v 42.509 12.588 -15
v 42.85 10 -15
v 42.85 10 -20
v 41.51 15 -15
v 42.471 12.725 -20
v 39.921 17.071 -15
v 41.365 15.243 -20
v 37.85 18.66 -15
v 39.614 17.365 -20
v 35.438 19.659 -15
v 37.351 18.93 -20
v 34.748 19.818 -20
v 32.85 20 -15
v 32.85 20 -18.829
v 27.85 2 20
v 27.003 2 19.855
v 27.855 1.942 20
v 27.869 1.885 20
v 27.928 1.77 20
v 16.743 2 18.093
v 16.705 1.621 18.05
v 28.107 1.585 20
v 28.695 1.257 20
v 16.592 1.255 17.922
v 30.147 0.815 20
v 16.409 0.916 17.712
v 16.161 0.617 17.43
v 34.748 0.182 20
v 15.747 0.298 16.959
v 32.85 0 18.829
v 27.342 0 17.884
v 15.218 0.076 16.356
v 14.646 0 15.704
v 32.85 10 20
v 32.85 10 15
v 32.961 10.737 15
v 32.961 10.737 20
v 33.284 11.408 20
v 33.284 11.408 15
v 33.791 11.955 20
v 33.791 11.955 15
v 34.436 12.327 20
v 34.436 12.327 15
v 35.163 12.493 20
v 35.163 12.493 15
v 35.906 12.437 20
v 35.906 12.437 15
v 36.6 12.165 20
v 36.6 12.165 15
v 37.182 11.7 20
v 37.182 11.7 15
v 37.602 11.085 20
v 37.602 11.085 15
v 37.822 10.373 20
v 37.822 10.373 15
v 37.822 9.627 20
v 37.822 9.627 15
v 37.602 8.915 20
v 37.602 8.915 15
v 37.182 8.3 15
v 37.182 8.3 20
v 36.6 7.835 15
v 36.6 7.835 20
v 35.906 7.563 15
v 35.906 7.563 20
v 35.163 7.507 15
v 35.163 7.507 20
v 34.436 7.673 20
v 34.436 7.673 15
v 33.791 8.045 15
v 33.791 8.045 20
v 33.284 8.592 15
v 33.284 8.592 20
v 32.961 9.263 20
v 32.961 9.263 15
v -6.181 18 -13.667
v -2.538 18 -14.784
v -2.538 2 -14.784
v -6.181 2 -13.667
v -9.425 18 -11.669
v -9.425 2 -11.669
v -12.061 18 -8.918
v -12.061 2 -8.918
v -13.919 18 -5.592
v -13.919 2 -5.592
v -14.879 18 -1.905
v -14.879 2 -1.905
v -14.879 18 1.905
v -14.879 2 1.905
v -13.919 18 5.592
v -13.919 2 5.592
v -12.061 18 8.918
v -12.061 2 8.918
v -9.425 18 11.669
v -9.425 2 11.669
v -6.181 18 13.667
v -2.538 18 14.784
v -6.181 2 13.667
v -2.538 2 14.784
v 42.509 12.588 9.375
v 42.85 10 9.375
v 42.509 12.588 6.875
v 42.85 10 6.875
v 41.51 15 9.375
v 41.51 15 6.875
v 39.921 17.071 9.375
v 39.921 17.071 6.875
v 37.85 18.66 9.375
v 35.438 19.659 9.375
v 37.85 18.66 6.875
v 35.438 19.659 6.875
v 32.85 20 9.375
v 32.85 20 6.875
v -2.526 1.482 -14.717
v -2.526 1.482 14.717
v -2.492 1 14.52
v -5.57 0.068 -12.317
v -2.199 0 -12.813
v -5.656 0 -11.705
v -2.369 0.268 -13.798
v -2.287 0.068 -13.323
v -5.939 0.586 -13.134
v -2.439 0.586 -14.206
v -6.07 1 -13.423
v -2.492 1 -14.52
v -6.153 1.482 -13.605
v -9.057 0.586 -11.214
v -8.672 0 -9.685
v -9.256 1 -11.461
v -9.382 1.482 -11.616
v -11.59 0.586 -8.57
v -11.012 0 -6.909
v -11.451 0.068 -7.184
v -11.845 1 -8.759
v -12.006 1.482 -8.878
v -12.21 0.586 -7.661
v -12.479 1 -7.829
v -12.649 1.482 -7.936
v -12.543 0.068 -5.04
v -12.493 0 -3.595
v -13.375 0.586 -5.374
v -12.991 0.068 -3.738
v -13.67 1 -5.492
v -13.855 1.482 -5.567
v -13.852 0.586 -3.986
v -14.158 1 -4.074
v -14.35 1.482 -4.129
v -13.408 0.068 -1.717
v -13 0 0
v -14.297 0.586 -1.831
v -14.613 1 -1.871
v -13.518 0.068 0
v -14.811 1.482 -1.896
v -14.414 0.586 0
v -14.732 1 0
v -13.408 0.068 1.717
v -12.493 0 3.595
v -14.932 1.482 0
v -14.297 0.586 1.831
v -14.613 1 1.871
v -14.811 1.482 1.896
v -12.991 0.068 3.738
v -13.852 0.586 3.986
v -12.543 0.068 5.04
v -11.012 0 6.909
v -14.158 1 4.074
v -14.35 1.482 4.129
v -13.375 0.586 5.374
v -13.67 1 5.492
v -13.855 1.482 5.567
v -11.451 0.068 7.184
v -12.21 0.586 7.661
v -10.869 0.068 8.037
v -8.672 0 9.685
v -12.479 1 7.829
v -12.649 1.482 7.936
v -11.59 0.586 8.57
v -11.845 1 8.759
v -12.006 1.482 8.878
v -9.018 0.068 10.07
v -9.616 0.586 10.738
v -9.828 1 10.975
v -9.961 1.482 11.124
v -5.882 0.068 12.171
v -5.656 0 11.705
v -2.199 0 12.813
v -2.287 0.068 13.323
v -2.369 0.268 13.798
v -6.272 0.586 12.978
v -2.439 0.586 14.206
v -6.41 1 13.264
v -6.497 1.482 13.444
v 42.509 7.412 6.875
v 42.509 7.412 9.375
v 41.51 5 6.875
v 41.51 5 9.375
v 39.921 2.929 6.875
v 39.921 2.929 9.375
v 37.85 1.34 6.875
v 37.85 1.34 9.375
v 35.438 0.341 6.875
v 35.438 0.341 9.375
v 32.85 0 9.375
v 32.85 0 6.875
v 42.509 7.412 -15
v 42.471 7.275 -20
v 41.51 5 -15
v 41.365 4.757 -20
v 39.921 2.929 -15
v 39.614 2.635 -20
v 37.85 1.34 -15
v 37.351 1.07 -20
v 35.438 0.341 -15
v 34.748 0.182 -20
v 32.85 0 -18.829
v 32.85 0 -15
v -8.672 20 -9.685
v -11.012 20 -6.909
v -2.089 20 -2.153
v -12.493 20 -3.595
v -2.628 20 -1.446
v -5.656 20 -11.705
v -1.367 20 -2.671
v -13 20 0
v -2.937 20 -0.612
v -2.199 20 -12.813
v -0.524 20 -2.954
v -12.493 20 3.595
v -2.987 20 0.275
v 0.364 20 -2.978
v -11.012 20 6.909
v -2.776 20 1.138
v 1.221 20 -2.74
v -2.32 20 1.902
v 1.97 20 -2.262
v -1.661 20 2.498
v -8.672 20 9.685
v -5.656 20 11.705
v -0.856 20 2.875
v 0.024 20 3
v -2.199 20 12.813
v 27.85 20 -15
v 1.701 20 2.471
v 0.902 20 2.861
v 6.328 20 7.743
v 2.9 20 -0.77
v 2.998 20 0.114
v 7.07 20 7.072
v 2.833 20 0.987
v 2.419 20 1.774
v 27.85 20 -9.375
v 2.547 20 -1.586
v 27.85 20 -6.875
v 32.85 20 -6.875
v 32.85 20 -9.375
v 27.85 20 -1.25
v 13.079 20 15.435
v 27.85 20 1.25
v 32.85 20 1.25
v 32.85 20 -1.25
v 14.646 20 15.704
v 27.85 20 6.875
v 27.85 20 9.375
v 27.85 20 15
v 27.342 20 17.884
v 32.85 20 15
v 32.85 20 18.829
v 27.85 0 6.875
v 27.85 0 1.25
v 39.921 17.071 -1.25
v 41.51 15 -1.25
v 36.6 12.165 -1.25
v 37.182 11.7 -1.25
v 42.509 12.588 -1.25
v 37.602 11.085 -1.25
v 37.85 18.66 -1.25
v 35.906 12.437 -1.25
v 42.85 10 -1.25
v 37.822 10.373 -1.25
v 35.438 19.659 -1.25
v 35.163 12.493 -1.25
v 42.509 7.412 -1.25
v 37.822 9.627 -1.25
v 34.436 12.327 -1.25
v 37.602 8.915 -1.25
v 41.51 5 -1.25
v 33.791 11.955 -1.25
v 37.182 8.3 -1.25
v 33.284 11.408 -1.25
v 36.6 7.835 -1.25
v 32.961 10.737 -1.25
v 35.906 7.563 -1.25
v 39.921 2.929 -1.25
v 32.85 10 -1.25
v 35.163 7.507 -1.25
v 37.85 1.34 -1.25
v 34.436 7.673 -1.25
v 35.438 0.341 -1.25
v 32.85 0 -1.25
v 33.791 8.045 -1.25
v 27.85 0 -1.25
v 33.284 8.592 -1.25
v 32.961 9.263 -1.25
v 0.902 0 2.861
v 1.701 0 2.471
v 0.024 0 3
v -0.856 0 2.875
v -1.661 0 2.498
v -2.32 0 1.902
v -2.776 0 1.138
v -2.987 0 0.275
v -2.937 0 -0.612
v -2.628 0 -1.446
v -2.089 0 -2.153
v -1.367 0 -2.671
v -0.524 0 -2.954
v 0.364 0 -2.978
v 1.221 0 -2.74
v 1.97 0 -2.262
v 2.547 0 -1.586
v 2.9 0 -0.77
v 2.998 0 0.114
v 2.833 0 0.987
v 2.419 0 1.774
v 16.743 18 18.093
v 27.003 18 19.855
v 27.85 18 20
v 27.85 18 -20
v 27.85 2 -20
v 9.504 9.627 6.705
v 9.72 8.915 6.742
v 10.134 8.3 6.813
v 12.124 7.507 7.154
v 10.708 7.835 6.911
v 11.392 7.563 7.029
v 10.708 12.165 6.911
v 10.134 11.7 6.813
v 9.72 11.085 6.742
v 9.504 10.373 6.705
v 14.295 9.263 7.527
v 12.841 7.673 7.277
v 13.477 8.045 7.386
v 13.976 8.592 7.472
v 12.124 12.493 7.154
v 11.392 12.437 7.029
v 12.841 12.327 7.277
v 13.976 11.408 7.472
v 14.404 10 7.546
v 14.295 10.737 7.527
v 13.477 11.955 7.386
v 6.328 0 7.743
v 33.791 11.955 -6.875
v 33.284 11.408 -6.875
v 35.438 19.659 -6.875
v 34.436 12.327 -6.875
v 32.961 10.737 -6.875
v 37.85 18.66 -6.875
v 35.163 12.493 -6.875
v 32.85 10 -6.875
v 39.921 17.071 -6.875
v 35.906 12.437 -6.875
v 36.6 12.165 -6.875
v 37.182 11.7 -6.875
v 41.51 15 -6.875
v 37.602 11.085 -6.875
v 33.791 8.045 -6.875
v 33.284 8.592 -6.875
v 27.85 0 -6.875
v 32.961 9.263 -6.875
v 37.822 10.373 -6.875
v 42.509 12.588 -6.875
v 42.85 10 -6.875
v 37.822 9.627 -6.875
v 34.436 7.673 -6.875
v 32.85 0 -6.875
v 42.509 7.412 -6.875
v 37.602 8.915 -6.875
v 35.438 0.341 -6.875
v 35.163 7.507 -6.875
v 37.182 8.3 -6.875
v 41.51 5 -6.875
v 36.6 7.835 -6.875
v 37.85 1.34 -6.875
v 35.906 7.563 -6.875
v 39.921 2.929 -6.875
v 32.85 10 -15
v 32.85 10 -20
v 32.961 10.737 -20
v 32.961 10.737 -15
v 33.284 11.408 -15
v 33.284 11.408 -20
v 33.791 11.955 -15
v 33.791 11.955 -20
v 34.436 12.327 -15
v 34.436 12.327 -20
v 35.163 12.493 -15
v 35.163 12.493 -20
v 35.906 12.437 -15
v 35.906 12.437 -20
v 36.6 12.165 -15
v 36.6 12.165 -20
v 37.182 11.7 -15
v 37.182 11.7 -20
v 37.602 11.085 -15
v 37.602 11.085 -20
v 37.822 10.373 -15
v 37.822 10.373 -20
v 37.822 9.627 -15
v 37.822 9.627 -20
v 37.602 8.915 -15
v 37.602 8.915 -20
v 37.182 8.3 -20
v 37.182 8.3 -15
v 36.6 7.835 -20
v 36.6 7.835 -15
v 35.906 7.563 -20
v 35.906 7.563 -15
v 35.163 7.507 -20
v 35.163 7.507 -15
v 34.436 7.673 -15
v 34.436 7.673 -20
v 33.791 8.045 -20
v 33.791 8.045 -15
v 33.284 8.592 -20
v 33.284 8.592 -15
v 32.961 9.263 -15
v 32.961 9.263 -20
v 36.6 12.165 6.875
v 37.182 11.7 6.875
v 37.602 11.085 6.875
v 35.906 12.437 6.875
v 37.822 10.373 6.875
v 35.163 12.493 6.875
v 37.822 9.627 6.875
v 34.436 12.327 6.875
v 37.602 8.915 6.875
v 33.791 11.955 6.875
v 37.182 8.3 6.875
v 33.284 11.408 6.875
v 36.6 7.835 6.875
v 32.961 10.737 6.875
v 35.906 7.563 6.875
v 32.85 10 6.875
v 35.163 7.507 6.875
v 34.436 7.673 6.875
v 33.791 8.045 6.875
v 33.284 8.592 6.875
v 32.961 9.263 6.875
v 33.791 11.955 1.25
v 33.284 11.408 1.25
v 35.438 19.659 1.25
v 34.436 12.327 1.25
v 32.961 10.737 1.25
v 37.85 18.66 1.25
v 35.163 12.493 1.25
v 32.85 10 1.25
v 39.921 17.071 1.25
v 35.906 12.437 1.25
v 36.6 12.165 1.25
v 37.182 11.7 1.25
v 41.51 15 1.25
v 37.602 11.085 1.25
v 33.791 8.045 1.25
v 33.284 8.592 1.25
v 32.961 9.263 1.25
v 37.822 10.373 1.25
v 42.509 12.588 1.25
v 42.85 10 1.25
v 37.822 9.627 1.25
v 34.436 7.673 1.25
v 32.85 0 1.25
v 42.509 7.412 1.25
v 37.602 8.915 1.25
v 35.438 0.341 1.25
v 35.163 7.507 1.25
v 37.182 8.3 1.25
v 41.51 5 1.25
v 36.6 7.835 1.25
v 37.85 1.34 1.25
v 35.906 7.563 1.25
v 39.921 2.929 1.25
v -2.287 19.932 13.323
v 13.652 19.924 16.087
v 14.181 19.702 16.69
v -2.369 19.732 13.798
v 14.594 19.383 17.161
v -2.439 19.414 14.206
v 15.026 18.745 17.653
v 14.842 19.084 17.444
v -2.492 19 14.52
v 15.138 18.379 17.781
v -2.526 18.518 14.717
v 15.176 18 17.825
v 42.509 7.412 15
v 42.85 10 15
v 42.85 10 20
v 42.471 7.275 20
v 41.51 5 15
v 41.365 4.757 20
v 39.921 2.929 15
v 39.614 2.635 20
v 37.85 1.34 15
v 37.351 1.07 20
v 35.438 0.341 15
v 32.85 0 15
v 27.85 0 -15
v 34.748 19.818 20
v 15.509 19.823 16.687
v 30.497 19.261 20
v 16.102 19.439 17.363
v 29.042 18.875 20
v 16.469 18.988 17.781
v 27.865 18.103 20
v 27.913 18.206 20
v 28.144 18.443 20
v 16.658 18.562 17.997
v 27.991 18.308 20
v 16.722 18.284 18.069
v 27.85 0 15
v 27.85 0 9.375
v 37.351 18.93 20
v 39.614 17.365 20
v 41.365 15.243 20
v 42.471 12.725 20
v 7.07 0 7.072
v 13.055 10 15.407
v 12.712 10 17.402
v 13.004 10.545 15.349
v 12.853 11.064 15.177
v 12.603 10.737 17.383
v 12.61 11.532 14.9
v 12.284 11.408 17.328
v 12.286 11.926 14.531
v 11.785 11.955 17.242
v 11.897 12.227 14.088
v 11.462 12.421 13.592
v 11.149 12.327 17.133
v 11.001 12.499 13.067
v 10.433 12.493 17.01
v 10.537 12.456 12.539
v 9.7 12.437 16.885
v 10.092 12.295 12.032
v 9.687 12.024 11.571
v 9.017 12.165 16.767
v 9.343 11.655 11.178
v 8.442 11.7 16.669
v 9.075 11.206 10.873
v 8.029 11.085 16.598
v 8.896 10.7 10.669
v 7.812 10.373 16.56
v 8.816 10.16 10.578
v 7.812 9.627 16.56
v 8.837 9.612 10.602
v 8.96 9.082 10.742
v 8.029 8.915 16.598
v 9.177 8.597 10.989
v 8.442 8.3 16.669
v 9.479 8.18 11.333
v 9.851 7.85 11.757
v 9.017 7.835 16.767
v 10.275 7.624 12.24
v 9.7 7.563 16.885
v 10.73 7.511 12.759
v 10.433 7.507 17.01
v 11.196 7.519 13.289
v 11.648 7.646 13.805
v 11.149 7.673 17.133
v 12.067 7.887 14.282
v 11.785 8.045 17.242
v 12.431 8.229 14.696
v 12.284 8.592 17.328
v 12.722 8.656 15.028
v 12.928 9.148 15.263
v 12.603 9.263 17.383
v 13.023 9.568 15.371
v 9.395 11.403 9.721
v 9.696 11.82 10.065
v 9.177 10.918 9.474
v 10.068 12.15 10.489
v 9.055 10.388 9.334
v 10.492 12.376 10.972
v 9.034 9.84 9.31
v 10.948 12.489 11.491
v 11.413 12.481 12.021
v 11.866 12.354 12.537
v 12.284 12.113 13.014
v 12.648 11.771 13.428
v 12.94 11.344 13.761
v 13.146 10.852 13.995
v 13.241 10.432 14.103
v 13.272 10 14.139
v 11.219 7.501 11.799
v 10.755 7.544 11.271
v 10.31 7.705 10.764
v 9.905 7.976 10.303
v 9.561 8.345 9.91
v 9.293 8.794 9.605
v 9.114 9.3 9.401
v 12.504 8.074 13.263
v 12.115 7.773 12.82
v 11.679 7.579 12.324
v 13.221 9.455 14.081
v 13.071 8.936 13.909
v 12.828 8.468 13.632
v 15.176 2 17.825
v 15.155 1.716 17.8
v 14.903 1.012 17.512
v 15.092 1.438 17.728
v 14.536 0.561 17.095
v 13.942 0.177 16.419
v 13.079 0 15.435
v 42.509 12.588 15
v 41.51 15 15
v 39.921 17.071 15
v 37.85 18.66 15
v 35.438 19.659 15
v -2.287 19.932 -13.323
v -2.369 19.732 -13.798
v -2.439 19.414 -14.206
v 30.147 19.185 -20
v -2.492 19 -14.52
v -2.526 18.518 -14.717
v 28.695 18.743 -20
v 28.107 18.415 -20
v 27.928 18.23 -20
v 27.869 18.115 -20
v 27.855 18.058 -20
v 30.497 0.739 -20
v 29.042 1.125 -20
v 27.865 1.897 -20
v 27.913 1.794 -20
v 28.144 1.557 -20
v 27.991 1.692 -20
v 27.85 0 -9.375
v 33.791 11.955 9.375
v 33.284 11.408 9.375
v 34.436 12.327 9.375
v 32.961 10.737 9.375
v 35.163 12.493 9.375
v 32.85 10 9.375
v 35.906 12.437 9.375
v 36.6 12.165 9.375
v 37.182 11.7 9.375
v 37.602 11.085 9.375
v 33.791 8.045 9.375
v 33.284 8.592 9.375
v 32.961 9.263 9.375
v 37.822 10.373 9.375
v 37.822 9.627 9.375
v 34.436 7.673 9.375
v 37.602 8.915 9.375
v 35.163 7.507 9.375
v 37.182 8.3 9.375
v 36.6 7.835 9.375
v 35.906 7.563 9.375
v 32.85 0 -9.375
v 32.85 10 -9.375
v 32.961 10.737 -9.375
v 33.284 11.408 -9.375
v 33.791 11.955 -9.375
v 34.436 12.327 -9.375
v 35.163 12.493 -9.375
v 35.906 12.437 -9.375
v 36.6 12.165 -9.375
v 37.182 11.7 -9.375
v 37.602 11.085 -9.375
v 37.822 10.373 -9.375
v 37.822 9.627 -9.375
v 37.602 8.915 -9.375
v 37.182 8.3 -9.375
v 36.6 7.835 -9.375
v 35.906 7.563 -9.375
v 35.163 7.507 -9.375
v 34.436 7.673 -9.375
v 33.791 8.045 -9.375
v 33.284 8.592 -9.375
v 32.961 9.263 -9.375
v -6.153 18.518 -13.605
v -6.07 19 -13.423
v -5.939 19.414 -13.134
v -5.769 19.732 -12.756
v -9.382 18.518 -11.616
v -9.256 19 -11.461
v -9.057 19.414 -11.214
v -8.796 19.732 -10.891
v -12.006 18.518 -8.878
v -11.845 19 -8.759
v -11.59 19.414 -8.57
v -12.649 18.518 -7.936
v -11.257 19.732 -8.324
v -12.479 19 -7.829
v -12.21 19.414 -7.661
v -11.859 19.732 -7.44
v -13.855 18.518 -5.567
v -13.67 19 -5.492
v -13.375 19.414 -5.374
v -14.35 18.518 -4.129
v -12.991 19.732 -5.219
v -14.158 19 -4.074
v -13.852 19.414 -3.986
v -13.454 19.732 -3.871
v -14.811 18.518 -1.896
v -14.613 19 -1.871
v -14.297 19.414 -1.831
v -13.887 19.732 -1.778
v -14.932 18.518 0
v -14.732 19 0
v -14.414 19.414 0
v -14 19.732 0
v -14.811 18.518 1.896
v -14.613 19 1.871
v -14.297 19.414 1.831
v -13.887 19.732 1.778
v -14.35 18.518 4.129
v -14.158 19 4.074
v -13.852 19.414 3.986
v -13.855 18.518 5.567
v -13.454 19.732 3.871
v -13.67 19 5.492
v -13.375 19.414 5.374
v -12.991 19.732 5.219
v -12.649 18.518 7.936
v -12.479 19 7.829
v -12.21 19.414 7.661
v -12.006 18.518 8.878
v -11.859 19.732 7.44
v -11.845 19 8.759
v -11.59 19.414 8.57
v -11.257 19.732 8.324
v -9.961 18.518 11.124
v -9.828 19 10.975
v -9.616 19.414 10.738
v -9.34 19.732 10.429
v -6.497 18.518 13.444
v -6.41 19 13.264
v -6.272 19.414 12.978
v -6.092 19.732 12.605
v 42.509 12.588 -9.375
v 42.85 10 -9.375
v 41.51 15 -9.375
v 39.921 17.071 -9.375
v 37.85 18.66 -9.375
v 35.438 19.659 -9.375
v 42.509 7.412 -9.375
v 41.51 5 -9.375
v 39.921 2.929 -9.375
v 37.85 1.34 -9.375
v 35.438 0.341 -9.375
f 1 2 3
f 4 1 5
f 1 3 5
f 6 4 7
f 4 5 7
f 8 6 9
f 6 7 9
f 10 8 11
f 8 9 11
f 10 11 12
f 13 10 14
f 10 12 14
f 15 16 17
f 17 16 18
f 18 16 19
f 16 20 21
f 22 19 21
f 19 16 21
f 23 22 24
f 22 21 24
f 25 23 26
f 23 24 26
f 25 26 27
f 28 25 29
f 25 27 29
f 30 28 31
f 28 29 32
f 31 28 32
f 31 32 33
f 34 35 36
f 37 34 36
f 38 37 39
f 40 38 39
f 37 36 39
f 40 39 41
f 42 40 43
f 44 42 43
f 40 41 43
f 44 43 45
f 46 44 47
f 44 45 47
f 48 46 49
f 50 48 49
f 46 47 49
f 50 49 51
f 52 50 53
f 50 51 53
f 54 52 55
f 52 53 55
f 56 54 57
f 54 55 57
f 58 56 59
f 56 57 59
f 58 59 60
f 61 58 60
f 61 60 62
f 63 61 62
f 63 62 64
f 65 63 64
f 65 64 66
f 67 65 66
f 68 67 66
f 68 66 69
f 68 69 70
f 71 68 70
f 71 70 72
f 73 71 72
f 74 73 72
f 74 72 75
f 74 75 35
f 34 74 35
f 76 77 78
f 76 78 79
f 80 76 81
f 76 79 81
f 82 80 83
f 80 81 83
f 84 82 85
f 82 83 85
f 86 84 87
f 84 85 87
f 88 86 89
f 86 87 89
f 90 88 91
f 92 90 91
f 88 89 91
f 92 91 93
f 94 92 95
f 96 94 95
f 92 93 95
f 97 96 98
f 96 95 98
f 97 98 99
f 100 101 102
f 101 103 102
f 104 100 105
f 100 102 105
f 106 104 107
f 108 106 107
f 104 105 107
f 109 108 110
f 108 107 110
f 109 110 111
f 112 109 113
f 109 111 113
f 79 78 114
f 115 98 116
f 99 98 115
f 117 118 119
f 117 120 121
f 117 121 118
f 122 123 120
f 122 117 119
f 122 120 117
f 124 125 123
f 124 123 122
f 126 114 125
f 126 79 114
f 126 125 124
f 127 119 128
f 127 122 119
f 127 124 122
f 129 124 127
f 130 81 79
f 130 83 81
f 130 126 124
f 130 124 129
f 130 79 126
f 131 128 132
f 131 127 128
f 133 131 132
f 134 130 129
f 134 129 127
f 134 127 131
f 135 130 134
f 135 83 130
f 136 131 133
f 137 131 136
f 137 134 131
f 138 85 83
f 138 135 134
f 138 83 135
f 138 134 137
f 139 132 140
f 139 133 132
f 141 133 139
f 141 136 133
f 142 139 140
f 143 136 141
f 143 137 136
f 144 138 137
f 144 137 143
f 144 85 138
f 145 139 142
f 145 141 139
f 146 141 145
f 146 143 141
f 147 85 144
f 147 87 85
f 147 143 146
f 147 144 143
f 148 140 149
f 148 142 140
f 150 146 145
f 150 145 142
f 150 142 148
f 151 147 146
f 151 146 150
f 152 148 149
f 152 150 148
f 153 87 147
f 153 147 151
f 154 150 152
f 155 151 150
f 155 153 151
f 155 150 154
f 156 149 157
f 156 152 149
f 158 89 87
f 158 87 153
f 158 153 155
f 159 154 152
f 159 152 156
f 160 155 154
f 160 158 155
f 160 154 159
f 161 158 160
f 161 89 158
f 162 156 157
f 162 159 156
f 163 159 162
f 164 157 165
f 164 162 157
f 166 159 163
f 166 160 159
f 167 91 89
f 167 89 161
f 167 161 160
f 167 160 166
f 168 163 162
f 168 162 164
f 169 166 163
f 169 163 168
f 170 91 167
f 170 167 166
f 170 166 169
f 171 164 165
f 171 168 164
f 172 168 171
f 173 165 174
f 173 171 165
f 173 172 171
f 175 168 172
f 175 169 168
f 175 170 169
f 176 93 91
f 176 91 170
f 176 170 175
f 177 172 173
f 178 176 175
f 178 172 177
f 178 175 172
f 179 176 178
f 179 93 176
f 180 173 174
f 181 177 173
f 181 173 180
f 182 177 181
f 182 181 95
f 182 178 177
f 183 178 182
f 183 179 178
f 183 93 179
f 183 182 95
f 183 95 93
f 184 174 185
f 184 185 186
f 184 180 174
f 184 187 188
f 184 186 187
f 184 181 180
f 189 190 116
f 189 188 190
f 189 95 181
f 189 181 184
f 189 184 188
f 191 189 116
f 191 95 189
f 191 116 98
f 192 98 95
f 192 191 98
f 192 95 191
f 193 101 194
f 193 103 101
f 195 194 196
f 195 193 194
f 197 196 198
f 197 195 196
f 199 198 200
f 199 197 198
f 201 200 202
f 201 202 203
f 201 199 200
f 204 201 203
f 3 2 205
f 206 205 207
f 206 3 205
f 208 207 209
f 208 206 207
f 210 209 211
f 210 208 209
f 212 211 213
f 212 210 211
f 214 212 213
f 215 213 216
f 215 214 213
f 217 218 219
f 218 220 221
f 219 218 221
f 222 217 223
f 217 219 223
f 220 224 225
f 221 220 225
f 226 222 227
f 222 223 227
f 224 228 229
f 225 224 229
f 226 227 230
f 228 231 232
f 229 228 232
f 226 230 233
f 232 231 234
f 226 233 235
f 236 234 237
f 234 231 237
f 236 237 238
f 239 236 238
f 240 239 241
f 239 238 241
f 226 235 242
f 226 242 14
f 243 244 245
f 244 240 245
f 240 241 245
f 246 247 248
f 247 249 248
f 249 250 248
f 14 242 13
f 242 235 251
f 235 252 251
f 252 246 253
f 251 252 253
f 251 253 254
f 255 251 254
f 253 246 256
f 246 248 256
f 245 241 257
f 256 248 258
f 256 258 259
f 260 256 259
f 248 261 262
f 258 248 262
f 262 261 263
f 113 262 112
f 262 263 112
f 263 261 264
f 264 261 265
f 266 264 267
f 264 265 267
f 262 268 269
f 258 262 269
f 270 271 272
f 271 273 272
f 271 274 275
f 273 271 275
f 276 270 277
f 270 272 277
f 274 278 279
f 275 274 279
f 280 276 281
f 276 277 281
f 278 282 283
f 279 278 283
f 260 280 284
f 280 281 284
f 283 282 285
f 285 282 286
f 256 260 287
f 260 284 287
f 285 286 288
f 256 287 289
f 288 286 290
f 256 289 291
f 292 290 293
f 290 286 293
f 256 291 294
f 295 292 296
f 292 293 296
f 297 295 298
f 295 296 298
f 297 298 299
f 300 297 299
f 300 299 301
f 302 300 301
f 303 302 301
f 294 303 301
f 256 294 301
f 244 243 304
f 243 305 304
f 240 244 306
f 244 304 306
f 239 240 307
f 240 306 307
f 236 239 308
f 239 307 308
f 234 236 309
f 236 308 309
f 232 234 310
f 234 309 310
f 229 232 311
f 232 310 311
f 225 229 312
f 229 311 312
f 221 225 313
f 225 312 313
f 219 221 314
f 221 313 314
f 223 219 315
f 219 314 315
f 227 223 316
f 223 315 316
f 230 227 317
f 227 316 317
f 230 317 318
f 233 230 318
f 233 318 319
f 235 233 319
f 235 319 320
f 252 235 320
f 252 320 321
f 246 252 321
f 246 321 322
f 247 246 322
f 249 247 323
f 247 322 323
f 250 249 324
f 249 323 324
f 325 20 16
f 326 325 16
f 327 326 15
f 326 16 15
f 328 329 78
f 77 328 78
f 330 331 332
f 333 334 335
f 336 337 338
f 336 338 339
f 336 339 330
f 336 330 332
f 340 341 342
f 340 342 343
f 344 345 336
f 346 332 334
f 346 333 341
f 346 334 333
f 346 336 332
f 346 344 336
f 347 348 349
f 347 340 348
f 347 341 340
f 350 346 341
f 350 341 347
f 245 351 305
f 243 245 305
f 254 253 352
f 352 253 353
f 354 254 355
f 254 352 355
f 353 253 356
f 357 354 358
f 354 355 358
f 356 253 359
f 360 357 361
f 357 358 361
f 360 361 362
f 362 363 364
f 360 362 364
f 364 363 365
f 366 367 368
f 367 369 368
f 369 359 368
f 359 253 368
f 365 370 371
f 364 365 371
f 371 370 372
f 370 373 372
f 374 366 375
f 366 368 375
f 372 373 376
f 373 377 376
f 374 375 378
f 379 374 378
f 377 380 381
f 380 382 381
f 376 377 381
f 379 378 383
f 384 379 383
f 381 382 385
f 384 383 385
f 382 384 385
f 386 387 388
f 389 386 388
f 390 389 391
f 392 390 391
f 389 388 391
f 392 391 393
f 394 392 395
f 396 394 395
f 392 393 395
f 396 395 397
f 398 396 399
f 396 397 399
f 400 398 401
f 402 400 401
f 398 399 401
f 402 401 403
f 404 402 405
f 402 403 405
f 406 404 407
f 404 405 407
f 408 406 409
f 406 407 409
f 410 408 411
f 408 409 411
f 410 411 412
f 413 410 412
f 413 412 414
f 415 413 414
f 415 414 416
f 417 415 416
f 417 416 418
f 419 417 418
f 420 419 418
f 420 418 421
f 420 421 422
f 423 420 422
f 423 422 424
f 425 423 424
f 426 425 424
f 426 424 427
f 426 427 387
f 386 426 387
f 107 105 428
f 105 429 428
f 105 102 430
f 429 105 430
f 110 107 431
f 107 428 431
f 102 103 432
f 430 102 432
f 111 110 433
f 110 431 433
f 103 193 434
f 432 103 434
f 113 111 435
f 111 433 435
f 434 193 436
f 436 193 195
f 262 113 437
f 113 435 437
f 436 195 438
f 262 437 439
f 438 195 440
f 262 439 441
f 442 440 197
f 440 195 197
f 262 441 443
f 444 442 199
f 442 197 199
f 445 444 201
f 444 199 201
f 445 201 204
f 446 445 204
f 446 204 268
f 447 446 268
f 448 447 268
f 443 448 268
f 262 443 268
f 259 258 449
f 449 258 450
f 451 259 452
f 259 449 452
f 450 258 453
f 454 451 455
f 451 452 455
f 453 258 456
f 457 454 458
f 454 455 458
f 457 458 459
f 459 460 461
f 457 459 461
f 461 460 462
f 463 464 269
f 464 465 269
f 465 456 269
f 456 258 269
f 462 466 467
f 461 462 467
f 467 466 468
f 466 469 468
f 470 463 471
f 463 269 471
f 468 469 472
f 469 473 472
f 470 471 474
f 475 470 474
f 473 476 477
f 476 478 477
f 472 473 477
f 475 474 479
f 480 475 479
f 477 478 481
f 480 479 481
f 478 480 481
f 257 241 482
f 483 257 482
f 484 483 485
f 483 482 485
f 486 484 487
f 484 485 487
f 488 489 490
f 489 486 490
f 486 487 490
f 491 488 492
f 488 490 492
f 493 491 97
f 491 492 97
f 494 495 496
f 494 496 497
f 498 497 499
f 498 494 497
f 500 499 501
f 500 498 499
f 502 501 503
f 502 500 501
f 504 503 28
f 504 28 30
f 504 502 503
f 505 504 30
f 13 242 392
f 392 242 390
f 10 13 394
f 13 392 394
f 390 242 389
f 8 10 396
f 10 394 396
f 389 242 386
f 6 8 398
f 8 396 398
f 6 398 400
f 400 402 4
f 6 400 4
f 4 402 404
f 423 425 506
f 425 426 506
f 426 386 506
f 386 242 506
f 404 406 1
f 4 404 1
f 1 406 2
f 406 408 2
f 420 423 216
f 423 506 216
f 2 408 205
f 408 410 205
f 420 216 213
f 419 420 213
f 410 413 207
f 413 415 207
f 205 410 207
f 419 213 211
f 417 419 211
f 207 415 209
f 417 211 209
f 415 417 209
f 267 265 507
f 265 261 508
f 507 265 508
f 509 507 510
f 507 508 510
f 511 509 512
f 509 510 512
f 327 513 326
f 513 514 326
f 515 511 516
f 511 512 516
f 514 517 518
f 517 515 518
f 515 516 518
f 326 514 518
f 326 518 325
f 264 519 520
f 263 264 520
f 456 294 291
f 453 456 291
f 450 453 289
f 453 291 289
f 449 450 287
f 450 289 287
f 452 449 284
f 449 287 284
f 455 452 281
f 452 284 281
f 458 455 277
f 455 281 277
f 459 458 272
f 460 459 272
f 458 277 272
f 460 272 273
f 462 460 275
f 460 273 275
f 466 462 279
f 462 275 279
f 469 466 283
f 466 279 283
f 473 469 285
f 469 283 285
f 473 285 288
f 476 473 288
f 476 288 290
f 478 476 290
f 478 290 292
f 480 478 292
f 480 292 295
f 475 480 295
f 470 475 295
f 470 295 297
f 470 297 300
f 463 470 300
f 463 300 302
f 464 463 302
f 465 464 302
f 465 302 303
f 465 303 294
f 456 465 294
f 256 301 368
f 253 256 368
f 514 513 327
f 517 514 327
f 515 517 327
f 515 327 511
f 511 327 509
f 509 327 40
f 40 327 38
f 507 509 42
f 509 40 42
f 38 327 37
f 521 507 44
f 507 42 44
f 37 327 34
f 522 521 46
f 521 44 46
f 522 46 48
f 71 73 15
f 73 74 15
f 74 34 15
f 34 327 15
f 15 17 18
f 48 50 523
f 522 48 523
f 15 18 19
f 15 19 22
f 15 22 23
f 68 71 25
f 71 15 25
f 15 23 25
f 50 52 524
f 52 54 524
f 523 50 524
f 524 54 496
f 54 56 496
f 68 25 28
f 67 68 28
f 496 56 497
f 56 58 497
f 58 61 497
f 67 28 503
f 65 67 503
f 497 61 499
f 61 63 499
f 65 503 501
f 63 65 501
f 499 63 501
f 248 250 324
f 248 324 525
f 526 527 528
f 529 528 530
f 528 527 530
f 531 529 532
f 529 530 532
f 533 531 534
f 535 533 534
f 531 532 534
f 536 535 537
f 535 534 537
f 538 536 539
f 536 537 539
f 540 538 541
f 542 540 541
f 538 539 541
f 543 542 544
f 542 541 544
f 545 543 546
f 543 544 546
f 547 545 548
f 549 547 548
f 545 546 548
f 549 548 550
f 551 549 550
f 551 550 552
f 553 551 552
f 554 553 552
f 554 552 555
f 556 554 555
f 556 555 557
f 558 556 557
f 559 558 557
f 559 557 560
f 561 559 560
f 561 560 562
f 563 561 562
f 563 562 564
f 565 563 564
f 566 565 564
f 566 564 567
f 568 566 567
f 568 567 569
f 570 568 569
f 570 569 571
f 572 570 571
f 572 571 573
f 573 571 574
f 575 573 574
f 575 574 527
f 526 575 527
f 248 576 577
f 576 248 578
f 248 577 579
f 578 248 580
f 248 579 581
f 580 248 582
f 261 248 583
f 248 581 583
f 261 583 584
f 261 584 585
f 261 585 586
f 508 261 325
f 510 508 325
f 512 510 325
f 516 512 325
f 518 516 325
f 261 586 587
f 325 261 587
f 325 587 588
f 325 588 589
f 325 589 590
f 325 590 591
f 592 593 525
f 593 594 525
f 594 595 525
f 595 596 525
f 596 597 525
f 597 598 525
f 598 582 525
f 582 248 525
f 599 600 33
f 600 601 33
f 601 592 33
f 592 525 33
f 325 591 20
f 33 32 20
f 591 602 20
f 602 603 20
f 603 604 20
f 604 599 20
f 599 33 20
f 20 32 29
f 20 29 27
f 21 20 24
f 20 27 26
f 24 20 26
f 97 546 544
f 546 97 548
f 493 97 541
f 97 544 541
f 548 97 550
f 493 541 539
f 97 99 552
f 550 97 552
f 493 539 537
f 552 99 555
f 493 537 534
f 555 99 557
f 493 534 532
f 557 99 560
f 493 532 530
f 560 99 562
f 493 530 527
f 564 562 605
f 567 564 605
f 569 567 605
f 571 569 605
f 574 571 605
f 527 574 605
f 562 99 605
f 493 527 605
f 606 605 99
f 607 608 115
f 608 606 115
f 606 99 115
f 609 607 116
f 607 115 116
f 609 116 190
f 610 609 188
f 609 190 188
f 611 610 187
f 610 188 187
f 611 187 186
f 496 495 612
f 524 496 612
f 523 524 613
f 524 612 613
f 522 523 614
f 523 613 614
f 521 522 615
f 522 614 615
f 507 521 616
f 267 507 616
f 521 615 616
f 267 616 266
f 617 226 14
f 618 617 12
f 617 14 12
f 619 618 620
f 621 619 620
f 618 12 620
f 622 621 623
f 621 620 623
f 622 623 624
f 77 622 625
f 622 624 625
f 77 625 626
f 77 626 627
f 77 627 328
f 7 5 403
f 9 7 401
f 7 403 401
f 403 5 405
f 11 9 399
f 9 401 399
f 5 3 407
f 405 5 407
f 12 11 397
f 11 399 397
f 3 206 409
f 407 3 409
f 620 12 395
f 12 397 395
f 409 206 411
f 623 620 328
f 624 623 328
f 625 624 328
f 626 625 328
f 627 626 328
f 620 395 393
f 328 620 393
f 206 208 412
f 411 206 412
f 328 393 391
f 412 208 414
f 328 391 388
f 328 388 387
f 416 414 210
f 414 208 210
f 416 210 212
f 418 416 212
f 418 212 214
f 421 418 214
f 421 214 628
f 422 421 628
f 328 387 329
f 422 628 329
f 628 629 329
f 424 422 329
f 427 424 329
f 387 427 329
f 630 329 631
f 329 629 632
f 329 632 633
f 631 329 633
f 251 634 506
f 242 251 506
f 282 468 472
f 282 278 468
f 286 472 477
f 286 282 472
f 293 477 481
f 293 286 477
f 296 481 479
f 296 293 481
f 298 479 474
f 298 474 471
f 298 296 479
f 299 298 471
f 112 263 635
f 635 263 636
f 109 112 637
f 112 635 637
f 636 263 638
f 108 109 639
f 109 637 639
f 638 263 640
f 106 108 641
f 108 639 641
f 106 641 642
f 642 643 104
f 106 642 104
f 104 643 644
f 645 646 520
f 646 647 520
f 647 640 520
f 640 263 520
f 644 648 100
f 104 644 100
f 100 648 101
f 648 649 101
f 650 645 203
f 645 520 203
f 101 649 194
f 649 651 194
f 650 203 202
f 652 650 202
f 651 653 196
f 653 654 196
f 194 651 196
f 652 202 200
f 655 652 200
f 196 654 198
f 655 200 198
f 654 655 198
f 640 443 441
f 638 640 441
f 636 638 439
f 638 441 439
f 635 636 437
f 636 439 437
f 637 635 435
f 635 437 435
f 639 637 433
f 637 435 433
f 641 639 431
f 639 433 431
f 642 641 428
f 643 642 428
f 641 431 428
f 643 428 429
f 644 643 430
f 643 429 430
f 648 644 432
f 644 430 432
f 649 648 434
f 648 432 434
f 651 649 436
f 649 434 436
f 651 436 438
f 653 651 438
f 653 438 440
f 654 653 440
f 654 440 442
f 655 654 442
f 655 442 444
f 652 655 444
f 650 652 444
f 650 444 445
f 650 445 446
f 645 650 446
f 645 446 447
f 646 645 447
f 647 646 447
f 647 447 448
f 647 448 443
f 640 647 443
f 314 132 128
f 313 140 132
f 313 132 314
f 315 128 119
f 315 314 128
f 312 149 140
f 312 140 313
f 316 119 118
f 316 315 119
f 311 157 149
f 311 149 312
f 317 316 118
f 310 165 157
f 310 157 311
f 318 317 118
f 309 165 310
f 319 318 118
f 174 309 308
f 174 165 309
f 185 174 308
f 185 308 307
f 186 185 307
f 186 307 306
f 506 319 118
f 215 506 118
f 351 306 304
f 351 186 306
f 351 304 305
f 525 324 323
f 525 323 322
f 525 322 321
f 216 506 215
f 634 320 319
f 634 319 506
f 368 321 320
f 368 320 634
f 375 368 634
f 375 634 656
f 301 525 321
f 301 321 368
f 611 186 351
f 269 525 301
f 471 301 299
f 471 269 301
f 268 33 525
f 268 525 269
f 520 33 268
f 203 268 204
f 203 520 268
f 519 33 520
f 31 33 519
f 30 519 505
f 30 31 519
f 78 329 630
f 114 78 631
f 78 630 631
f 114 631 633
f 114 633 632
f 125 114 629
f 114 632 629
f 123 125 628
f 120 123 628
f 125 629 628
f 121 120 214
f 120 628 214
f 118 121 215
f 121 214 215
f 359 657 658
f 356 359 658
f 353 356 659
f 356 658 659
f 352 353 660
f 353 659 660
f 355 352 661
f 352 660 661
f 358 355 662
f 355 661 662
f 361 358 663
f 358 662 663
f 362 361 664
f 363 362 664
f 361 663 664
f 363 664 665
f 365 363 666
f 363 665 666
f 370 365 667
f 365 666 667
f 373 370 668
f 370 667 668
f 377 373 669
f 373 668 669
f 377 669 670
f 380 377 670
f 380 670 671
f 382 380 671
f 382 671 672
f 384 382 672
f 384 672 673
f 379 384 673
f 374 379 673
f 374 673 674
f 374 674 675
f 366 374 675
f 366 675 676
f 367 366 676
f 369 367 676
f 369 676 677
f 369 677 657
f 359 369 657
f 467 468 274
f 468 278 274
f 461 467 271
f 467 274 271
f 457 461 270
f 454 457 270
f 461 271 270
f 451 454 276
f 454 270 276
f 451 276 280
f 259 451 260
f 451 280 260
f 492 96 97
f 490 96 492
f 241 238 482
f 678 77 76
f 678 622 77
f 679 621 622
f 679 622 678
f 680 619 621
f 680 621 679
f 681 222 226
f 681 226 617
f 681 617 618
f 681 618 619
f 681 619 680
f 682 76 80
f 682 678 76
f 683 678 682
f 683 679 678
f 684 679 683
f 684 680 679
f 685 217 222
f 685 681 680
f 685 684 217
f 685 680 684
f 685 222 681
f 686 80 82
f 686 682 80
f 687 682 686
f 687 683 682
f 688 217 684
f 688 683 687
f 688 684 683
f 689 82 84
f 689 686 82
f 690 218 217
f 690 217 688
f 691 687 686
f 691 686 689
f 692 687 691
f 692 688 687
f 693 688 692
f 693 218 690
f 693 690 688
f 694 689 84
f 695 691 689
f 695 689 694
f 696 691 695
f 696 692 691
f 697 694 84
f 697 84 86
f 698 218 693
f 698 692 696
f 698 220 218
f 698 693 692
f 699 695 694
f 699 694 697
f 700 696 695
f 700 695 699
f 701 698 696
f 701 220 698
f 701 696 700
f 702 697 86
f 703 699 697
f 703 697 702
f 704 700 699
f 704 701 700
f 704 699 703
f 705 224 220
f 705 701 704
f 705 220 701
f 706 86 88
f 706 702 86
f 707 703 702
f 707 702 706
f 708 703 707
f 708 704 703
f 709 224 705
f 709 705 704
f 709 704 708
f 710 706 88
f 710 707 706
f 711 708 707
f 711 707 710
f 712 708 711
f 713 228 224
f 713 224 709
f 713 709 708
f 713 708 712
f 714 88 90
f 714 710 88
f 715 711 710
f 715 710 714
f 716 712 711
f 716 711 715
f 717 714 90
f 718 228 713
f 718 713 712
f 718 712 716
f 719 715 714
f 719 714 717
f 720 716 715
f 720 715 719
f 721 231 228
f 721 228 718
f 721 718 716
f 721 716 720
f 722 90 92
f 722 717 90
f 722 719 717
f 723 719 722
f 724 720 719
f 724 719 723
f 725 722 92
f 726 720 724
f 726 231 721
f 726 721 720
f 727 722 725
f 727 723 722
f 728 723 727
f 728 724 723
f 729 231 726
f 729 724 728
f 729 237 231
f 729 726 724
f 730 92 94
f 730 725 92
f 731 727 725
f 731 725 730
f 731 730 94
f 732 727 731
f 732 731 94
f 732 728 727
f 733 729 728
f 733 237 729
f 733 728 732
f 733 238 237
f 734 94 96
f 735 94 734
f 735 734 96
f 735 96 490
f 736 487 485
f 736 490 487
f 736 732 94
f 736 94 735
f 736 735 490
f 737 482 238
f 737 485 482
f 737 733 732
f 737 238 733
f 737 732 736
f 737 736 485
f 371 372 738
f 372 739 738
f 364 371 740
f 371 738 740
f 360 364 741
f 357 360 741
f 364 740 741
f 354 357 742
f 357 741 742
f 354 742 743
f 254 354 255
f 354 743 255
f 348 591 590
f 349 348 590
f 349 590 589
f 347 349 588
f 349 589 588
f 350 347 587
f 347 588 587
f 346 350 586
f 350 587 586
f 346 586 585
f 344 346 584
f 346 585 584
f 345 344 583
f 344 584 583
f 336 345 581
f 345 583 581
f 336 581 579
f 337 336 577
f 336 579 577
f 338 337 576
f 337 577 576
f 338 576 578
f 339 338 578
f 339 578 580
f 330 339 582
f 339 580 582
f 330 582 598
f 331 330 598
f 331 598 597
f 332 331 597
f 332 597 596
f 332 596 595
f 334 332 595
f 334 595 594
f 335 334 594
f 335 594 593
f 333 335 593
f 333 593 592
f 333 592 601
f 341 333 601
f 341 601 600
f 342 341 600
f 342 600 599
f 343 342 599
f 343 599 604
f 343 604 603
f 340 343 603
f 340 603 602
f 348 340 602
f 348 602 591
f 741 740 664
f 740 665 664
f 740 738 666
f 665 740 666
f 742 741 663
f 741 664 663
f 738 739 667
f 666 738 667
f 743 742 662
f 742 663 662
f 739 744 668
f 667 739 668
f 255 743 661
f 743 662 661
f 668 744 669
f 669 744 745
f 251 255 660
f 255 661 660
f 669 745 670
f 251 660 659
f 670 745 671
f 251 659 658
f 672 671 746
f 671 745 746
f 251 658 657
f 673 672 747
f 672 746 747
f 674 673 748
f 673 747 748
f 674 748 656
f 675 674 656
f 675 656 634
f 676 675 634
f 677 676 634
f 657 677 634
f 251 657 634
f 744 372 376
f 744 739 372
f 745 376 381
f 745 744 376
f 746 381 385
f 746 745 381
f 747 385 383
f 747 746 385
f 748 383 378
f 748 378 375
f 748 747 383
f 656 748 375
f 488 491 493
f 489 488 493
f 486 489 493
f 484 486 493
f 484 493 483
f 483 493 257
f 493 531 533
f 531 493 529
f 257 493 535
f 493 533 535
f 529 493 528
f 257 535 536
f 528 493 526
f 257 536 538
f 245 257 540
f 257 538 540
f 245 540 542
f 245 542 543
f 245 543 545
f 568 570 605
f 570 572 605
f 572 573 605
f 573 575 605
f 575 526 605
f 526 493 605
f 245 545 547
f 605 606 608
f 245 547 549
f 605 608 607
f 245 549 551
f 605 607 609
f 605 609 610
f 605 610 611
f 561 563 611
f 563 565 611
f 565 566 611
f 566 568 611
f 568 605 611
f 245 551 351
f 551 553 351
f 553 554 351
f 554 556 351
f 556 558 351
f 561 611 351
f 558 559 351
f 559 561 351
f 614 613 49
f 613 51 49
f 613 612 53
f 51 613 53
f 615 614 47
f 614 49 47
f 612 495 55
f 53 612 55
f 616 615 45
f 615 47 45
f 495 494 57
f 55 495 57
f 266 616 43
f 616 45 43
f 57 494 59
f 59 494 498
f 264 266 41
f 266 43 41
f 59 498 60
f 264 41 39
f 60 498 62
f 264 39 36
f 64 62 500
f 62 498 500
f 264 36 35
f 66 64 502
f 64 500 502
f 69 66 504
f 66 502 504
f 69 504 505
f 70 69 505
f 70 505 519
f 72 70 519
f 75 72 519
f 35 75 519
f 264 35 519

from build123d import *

# Parameters (mm, degrees)
BOSS_EXTRUDE1_DEPTH = 20
FILLET1_R           = 10
SKETCH2_R           = 2.5
CUT_EXTRUDE1_DEPTH  = 40
FILLET2_R           = 2
SKETCH3_R           = 2.5
CUT_EXTRUDE2_DEPTH  = 10
SKETCH4_R           = 10
SKETCH4_R_2         = 3
BOSS_EXTRUDE2_DEPTH = 20
CUT_EXTRUDE3_DEPTH  = 52.342938219


# Some blends are built 0.0001 mm under size
with BuildPart() as part:
    # Sketch1 → Boss-Extrude1 (new body)
    with BuildSketch(Plane(origin=(0, 0, 0), x_dir=(1, 0, 0), z_dir=(0, 1, 0))):
        with BuildLine():
            Line((27.849705815, 9.375), (27.849705815, 15))
            Line((27.849705815, 15), (42.849705815, 15))
            Line((42.849705815, 15), (42.849705815, 20))
            Line((42.849705815, 20), (27.849705815, 20))
            Line((27.849705815, 20), (-2.537743238, 14.78377013))
            ThreePointArc((-2.537743238, 14.78377013), (-15, 0), (-2.537743238, -14.78377013))
            Line((-2.537743238, -14.78377013), (15.176440556, -17.824540498))
            Line((15.176440556, -17.824540498), (6.327966589, -7.743180151))
            ThreePointArc((6.327966589, -7.743180151), (-6.707251498, 7.417059885), (7.069754095, -7.072381285))
            Line((7.069754095, -7.072381285), (16.743020962, -18.093455585))
            Line((16.743020962, -18.093455585), (27.849705815, -20))
            Line((27.849705815, -20), (42.849705815, -20))
            Line((42.849705815, -20), (42.849705815, -15))
            Line((42.849705815, -15), (27.849705815, -15))
            Line((27.849705815, -15), (27.849705815, -9.375))
            Line((27.849705815, -9.375), (42.849705815, -9.375))
            Line((42.849705815, -9.375), (42.849705815, -6.875))
            Line((42.849705815, -6.875), (27.849705815, -6.875))
            Line((27.849705815, -6.875), (27.849705815, -1.25))
            Line((27.849705815, -1.25), (42.849705815, -1.25))
            Line((42.849705815, -1.25), (42.849705815, 1.25))
            Line((42.849705815, 1.25), (27.849705815, 1.25))
            Line((27.849705815, 1.25), (27.849705815, 6.875))
            Line((27.849705815, 6.875), (42.849705815, 6.875))
            Line((42.849705815, 6.875), (42.849705815, 9.375))
            Line((42.849705815, 9.375), (27.849705815, 9.375))
        make_face()
    extrude(amount=BOSS_EXTRUDE1_DEPTH)

    # Fillet1
    fillet1_edges = [part.edges().sort_by_distance(p)[0] for p in [
        (42.849705815, 0, 17.5),
        (42.849705815, 0, 8.125),
        (42.849705815, 0, 0),
        (42.849705815, 0, -8.125),
        (42.849705815, 0, -17.5),
        (42.849705815, 20, -17.5),
        (42.849705815, 20, -8.125),
        (42.849705815, 20, 0),
        (42.849705815, 20, 8.125),
        (42.849705815, 20, 17.5),
    ]]
    fillet(fillet1_edges, radius=FILLET1_R - 0.0001)  # a hair under: the kernel refuses the full size

    # Sketch2 → Cut-Extrude1 (cut)
    with BuildSketch(Plane(origin=(0, 0, -20), x_dir=(-1, 0, 0), z_dir=(0, 0, -1))):
        with Locations((-35.349705815, 10)):
            Circle(SKETCH2_R)
    extrude(amount=-CUT_EXTRUDE1_DEPTH, mode=Mode.SUBTRACT)

    # Fillet2
    # the kernel refuses this fillet: 2 mm, written as the material it takes off along each edge
    with BuildSketch(Plane(origin=(39.676721919, 0, -22.03019459), x_dir=(0.16918288251037936, 0, 0.9855846753402162), z_dir=(-0.9855846753402161, 0, 0.16918288251037933))) as fillet2_piece_1:
        with BuildLine():
            CenterArc((FILLET2_R, FILLET2_R), FILLET2_R, 180, 90)
            Line((0, FILLET2_R), (-FILLET2_R * 0.02, FILLET2_R))
            Line((-FILLET2_R * 0.02, FILLET2_R), (-FILLET2_R * 0.02, -FILLET2_R * 0.02))
            Line((-FILLET2_R * 0.02, -FILLET2_R * 0.02), (FILLET2_R, -FILLET2_R * 0.02))
            Line((FILLET2_R, -FILLET2_R * 0.02), (FILLET2_R, 0))
        make_face()
    extrude(amount=42.831900914, mode=Mode.SUBTRACT)
    with BuildSketch(Plane(origin=(-2.537743238, 0, 14.78377013), x_dir=(0.16918288251037944, 0, -0.9855846753402161), z_dir=(0.9855846753402161, 0, 0.16918288251037944))) as fillet2_piece_2:
        with BuildLine():
            CenterArc((FILLET2_R, FILLET2_R), FILLET2_R, 180, 90)
            Line((0, FILLET2_R), (-FILLET2_R * 0.02, FILLET2_R))
            Line((-FILLET2_R * 0.02, FILLET2_R), (-FILLET2_R * 0.02, -FILLET2_R * 0.02))
            Line((-FILLET2_R * 0.02, -FILLET2_R * 0.02), (FILLET2_R, -FILLET2_R * 0.02))
            Line((FILLET2_R, -FILLET2_R * 0.02), (FILLET2_R, 0))
        make_face()
    extrude(amount=29.973274379, mode=Mode.SUBTRACT)
    with BuildSketch(Plane(origin=(39.676721919, 20, -22.03019459), x_dir=(0.16918288251037936, 0, 0.9855846753402162), z_dir=(-0.9855846753402161, 0, 0.16918288251037933))) as fillet2_piece_3:
        with BuildLine():
            CenterArc((FILLET2_R, -FILLET2_R), FILLET2_R, 90, 90)
            Line((0, -FILLET2_R), (-FILLET2_R * 0.02, -FILLET2_R))
            Line((-FILLET2_R * 0.02, -FILLET2_R), (-FILLET2_R * 0.02, FILLET2_R * 0.02))
            Line((-FILLET2_R * 0.02, FILLET2_R * 0.02), (FILLET2_R, FILLET2_R * 0.02))
            Line((FILLET2_R, FILLET2_R * 0.02), (FILLET2_R, 0))
        make_face()
    extrude(amount=42.831900914, mode=Mode.SUBTRACT)
    with BuildSketch(Plane(origin=(-2.537743238, 20, 14.78377013), x_dir=(0.16918288251037944, 0, -0.9855846753402161), z_dir=(0.9855846753402161, 0, 0.16918288251037944))) as fillet2_piece_4:
        with BuildLine():
            CenterArc((FILLET2_R, -FILLET2_R), FILLET2_R, 90, 90)
            Line((0, -FILLET2_R), (-FILLET2_R * 0.02, -FILLET2_R))
            Line((-FILLET2_R * 0.02, -FILLET2_R), (-FILLET2_R * 0.02, FILLET2_R * 0.02))
            Line((-FILLET2_R * 0.02, FILLET2_R * 0.02), (FILLET2_R, FILLET2_R * 0.02))
            Line((FILLET2_R, FILLET2_R * 0.02), (FILLET2_R, 0))
        make_face()
    extrude(amount=29.973274379, mode=Mode.SUBTRACT)
    with BuildSketch(Plane(origin=(4.916004858, 0, 16.063260995), x_dir=(0.16918288251037944, 0, -0.9855846753402161), z_dir=(0.9855846753402161, 0, 0.16918288251037944))) as fillet2_piece_5:
        with BuildLine():
            CenterArc((FILLET2_R, FILLET2_R), FILLET2_R, 180, 90)
            Line((0, FILLET2_R), (-FILLET2_R * 0.02, FILLET2_R))
            Line((-FILLET2_R * 0.02, FILLET2_R), (-FILLET2_R * 0.02, -FILLET2_R * 0.02))
            Line((-FILLET2_R * 0.02, -FILLET2_R * 0.02), (FILLET2_R, -FILLET2_R * 0.02))
            Line((FILLET2_R, -FILLET2_R * 0.02), (FILLET2_R, 0))
        make_face()
    extrude(amount=35.269133064, mode=Mode.SUBTRACT)
    with BuildSketch(Plane(origin=(4.916004858, 20, 16.063260995), x_dir=(0.16918288251037944, 0, -0.9855846753402161), z_dir=(0.9855846753402161, 0, 0.16918288251037944))) as fillet2_piece_6:
        with BuildLine():
            CenterArc((FILLET2_R, -FILLET2_R), FILLET2_R, 90, 90)
            Line((0, -FILLET2_R), (-FILLET2_R * 0.02, -FILLET2_R))
            Line((-FILLET2_R * 0.02, -FILLET2_R), (-FILLET2_R * 0.02, FILLET2_R * 0.02))
            Line((-FILLET2_R * 0.02, FILLET2_R * 0.02), (FILLET2_R, FILLET2_R * 0.02))
            Line((FILLET2_R, FILLET2_R * 0.02), (FILLET2_R, 0))
        make_face()
    extrude(amount=35.269133064, mode=Mode.SUBTRACT)
    with BuildSketch(Plane(origin=(0, 0, 0), x_dir=(-0.16918288251037905, 0, -0.9855846753402162), z_dir=(0.9855846753402162, 0, -0.16918288251037905))) as fillet2_piece_7:
        with BuildLine():
            CenterArc((15 - FILLET2_R, FILLET2_R), FILLET2_R, 270, 90)
            Line((15, FILLET2_R), (15 + FILLET2_R * 0.02, FILLET2_R))
            Line((15 + FILLET2_R * 0.02, FILLET2_R), (15 + FILLET2_R * 0.02, -FILLET2_R * 0.02))
            Line((15 + FILLET2_R * 0.02, -FILLET2_R * 0.02), (15 - FILLET2_R, -FILLET2_R * 0.02))
            Line((15 - FILLET2_R, -FILLET2_R * 0.02), (15 - FILLET2_R, 0))
        make_face()
    revolve(axis=Axis((0, 0, 0), (0, 1, 0)), revolution_arc=160.519372943, mode=Mode.SUBTRACT)
    with BuildSketch(Plane(origin=(0, 20, 0), x_dir=(-0.16918288251037905, 0, -0.9855846753402162), z_dir=(0.9855846753402162, 0, -0.16918288251037905))) as fillet2_piece_8:
        with BuildLine():
            CenterArc((15 - FILLET2_R, -FILLET2_R), FILLET2_R, 0, 90)
            Line((15, -FILLET2_R), (15 + FILLET2_R * 0.02, -FILLET2_R))
            Line((15 + FILLET2_R * 0.02, -FILLET2_R), (15 + FILLET2_R * 0.02, FILLET2_R * 0.02))
            Line((15 + FILLET2_R * 0.02, FILLET2_R * 0.02), (15 - FILLET2_R, FILLET2_R * 0.02))
            Line((15 - FILLET2_R, FILLET2_R * 0.02), (15 - FILLET2_R, 0))
        make_face()
    revolve(axis=Axis((0, 20, 0), (0, 1, 0)), revolution_arc=160.519372943, mode=Mode.SUBTRACT)

    # Sketch3 → Cut-Extrude2 (cut)
    with BuildSketch(Plane(origin=(-2.537743238, 0, 14.78377013), x_dir=(0.9855846753402161, 0, 0.16918288251037955), z_dir=(-0.16918288251037955, 0, 0.9855846753402161))):
        with Locations((12.973274379, 10)):
            Circle(SKETCH3_R)
    extrude(amount=-CUT_EXTRUDE2_DEPTH, mode=Mode.SUBTRACT)

    # Sketch4 → Boss-Extrude2 (add)
    with BuildSketch(Plane.XZ):
        Circle(SKETCH4_R)
        with Locations(Location((0, 0, 0), (0, 0, 270))):
            Circle(SKETCH4_R_2, mode=Mode.SUBTRACT)
    extrude(amount=-BOSS_EXTRUDE2_DEPTH)

    # Sketch6 → Cut-Extrude3 (cut, through all)
    with BuildSketch(Plane.XZ):
        with BuildLine():
            ThreePointArc((7.069754095, 7.072381285), (6.707251498, 7.417059885), (6.327966589, 7.743180151))
            Line((6.327966589, 7.743180151), (1.700797535, 2.471292727))
            ThreePointArc((1.700797535, 2.471292727), (2.089347904, 2.152817999), (2.419304242, 1.773969274))
            Line((2.419304242, 1.773969274), (7.069754095, 7.072381285))
        make_face()
    extrude(amount=-CUT_EXTRUDE3_DEPTH, mode=Mode.SUBTRACT)


solid = part.part
